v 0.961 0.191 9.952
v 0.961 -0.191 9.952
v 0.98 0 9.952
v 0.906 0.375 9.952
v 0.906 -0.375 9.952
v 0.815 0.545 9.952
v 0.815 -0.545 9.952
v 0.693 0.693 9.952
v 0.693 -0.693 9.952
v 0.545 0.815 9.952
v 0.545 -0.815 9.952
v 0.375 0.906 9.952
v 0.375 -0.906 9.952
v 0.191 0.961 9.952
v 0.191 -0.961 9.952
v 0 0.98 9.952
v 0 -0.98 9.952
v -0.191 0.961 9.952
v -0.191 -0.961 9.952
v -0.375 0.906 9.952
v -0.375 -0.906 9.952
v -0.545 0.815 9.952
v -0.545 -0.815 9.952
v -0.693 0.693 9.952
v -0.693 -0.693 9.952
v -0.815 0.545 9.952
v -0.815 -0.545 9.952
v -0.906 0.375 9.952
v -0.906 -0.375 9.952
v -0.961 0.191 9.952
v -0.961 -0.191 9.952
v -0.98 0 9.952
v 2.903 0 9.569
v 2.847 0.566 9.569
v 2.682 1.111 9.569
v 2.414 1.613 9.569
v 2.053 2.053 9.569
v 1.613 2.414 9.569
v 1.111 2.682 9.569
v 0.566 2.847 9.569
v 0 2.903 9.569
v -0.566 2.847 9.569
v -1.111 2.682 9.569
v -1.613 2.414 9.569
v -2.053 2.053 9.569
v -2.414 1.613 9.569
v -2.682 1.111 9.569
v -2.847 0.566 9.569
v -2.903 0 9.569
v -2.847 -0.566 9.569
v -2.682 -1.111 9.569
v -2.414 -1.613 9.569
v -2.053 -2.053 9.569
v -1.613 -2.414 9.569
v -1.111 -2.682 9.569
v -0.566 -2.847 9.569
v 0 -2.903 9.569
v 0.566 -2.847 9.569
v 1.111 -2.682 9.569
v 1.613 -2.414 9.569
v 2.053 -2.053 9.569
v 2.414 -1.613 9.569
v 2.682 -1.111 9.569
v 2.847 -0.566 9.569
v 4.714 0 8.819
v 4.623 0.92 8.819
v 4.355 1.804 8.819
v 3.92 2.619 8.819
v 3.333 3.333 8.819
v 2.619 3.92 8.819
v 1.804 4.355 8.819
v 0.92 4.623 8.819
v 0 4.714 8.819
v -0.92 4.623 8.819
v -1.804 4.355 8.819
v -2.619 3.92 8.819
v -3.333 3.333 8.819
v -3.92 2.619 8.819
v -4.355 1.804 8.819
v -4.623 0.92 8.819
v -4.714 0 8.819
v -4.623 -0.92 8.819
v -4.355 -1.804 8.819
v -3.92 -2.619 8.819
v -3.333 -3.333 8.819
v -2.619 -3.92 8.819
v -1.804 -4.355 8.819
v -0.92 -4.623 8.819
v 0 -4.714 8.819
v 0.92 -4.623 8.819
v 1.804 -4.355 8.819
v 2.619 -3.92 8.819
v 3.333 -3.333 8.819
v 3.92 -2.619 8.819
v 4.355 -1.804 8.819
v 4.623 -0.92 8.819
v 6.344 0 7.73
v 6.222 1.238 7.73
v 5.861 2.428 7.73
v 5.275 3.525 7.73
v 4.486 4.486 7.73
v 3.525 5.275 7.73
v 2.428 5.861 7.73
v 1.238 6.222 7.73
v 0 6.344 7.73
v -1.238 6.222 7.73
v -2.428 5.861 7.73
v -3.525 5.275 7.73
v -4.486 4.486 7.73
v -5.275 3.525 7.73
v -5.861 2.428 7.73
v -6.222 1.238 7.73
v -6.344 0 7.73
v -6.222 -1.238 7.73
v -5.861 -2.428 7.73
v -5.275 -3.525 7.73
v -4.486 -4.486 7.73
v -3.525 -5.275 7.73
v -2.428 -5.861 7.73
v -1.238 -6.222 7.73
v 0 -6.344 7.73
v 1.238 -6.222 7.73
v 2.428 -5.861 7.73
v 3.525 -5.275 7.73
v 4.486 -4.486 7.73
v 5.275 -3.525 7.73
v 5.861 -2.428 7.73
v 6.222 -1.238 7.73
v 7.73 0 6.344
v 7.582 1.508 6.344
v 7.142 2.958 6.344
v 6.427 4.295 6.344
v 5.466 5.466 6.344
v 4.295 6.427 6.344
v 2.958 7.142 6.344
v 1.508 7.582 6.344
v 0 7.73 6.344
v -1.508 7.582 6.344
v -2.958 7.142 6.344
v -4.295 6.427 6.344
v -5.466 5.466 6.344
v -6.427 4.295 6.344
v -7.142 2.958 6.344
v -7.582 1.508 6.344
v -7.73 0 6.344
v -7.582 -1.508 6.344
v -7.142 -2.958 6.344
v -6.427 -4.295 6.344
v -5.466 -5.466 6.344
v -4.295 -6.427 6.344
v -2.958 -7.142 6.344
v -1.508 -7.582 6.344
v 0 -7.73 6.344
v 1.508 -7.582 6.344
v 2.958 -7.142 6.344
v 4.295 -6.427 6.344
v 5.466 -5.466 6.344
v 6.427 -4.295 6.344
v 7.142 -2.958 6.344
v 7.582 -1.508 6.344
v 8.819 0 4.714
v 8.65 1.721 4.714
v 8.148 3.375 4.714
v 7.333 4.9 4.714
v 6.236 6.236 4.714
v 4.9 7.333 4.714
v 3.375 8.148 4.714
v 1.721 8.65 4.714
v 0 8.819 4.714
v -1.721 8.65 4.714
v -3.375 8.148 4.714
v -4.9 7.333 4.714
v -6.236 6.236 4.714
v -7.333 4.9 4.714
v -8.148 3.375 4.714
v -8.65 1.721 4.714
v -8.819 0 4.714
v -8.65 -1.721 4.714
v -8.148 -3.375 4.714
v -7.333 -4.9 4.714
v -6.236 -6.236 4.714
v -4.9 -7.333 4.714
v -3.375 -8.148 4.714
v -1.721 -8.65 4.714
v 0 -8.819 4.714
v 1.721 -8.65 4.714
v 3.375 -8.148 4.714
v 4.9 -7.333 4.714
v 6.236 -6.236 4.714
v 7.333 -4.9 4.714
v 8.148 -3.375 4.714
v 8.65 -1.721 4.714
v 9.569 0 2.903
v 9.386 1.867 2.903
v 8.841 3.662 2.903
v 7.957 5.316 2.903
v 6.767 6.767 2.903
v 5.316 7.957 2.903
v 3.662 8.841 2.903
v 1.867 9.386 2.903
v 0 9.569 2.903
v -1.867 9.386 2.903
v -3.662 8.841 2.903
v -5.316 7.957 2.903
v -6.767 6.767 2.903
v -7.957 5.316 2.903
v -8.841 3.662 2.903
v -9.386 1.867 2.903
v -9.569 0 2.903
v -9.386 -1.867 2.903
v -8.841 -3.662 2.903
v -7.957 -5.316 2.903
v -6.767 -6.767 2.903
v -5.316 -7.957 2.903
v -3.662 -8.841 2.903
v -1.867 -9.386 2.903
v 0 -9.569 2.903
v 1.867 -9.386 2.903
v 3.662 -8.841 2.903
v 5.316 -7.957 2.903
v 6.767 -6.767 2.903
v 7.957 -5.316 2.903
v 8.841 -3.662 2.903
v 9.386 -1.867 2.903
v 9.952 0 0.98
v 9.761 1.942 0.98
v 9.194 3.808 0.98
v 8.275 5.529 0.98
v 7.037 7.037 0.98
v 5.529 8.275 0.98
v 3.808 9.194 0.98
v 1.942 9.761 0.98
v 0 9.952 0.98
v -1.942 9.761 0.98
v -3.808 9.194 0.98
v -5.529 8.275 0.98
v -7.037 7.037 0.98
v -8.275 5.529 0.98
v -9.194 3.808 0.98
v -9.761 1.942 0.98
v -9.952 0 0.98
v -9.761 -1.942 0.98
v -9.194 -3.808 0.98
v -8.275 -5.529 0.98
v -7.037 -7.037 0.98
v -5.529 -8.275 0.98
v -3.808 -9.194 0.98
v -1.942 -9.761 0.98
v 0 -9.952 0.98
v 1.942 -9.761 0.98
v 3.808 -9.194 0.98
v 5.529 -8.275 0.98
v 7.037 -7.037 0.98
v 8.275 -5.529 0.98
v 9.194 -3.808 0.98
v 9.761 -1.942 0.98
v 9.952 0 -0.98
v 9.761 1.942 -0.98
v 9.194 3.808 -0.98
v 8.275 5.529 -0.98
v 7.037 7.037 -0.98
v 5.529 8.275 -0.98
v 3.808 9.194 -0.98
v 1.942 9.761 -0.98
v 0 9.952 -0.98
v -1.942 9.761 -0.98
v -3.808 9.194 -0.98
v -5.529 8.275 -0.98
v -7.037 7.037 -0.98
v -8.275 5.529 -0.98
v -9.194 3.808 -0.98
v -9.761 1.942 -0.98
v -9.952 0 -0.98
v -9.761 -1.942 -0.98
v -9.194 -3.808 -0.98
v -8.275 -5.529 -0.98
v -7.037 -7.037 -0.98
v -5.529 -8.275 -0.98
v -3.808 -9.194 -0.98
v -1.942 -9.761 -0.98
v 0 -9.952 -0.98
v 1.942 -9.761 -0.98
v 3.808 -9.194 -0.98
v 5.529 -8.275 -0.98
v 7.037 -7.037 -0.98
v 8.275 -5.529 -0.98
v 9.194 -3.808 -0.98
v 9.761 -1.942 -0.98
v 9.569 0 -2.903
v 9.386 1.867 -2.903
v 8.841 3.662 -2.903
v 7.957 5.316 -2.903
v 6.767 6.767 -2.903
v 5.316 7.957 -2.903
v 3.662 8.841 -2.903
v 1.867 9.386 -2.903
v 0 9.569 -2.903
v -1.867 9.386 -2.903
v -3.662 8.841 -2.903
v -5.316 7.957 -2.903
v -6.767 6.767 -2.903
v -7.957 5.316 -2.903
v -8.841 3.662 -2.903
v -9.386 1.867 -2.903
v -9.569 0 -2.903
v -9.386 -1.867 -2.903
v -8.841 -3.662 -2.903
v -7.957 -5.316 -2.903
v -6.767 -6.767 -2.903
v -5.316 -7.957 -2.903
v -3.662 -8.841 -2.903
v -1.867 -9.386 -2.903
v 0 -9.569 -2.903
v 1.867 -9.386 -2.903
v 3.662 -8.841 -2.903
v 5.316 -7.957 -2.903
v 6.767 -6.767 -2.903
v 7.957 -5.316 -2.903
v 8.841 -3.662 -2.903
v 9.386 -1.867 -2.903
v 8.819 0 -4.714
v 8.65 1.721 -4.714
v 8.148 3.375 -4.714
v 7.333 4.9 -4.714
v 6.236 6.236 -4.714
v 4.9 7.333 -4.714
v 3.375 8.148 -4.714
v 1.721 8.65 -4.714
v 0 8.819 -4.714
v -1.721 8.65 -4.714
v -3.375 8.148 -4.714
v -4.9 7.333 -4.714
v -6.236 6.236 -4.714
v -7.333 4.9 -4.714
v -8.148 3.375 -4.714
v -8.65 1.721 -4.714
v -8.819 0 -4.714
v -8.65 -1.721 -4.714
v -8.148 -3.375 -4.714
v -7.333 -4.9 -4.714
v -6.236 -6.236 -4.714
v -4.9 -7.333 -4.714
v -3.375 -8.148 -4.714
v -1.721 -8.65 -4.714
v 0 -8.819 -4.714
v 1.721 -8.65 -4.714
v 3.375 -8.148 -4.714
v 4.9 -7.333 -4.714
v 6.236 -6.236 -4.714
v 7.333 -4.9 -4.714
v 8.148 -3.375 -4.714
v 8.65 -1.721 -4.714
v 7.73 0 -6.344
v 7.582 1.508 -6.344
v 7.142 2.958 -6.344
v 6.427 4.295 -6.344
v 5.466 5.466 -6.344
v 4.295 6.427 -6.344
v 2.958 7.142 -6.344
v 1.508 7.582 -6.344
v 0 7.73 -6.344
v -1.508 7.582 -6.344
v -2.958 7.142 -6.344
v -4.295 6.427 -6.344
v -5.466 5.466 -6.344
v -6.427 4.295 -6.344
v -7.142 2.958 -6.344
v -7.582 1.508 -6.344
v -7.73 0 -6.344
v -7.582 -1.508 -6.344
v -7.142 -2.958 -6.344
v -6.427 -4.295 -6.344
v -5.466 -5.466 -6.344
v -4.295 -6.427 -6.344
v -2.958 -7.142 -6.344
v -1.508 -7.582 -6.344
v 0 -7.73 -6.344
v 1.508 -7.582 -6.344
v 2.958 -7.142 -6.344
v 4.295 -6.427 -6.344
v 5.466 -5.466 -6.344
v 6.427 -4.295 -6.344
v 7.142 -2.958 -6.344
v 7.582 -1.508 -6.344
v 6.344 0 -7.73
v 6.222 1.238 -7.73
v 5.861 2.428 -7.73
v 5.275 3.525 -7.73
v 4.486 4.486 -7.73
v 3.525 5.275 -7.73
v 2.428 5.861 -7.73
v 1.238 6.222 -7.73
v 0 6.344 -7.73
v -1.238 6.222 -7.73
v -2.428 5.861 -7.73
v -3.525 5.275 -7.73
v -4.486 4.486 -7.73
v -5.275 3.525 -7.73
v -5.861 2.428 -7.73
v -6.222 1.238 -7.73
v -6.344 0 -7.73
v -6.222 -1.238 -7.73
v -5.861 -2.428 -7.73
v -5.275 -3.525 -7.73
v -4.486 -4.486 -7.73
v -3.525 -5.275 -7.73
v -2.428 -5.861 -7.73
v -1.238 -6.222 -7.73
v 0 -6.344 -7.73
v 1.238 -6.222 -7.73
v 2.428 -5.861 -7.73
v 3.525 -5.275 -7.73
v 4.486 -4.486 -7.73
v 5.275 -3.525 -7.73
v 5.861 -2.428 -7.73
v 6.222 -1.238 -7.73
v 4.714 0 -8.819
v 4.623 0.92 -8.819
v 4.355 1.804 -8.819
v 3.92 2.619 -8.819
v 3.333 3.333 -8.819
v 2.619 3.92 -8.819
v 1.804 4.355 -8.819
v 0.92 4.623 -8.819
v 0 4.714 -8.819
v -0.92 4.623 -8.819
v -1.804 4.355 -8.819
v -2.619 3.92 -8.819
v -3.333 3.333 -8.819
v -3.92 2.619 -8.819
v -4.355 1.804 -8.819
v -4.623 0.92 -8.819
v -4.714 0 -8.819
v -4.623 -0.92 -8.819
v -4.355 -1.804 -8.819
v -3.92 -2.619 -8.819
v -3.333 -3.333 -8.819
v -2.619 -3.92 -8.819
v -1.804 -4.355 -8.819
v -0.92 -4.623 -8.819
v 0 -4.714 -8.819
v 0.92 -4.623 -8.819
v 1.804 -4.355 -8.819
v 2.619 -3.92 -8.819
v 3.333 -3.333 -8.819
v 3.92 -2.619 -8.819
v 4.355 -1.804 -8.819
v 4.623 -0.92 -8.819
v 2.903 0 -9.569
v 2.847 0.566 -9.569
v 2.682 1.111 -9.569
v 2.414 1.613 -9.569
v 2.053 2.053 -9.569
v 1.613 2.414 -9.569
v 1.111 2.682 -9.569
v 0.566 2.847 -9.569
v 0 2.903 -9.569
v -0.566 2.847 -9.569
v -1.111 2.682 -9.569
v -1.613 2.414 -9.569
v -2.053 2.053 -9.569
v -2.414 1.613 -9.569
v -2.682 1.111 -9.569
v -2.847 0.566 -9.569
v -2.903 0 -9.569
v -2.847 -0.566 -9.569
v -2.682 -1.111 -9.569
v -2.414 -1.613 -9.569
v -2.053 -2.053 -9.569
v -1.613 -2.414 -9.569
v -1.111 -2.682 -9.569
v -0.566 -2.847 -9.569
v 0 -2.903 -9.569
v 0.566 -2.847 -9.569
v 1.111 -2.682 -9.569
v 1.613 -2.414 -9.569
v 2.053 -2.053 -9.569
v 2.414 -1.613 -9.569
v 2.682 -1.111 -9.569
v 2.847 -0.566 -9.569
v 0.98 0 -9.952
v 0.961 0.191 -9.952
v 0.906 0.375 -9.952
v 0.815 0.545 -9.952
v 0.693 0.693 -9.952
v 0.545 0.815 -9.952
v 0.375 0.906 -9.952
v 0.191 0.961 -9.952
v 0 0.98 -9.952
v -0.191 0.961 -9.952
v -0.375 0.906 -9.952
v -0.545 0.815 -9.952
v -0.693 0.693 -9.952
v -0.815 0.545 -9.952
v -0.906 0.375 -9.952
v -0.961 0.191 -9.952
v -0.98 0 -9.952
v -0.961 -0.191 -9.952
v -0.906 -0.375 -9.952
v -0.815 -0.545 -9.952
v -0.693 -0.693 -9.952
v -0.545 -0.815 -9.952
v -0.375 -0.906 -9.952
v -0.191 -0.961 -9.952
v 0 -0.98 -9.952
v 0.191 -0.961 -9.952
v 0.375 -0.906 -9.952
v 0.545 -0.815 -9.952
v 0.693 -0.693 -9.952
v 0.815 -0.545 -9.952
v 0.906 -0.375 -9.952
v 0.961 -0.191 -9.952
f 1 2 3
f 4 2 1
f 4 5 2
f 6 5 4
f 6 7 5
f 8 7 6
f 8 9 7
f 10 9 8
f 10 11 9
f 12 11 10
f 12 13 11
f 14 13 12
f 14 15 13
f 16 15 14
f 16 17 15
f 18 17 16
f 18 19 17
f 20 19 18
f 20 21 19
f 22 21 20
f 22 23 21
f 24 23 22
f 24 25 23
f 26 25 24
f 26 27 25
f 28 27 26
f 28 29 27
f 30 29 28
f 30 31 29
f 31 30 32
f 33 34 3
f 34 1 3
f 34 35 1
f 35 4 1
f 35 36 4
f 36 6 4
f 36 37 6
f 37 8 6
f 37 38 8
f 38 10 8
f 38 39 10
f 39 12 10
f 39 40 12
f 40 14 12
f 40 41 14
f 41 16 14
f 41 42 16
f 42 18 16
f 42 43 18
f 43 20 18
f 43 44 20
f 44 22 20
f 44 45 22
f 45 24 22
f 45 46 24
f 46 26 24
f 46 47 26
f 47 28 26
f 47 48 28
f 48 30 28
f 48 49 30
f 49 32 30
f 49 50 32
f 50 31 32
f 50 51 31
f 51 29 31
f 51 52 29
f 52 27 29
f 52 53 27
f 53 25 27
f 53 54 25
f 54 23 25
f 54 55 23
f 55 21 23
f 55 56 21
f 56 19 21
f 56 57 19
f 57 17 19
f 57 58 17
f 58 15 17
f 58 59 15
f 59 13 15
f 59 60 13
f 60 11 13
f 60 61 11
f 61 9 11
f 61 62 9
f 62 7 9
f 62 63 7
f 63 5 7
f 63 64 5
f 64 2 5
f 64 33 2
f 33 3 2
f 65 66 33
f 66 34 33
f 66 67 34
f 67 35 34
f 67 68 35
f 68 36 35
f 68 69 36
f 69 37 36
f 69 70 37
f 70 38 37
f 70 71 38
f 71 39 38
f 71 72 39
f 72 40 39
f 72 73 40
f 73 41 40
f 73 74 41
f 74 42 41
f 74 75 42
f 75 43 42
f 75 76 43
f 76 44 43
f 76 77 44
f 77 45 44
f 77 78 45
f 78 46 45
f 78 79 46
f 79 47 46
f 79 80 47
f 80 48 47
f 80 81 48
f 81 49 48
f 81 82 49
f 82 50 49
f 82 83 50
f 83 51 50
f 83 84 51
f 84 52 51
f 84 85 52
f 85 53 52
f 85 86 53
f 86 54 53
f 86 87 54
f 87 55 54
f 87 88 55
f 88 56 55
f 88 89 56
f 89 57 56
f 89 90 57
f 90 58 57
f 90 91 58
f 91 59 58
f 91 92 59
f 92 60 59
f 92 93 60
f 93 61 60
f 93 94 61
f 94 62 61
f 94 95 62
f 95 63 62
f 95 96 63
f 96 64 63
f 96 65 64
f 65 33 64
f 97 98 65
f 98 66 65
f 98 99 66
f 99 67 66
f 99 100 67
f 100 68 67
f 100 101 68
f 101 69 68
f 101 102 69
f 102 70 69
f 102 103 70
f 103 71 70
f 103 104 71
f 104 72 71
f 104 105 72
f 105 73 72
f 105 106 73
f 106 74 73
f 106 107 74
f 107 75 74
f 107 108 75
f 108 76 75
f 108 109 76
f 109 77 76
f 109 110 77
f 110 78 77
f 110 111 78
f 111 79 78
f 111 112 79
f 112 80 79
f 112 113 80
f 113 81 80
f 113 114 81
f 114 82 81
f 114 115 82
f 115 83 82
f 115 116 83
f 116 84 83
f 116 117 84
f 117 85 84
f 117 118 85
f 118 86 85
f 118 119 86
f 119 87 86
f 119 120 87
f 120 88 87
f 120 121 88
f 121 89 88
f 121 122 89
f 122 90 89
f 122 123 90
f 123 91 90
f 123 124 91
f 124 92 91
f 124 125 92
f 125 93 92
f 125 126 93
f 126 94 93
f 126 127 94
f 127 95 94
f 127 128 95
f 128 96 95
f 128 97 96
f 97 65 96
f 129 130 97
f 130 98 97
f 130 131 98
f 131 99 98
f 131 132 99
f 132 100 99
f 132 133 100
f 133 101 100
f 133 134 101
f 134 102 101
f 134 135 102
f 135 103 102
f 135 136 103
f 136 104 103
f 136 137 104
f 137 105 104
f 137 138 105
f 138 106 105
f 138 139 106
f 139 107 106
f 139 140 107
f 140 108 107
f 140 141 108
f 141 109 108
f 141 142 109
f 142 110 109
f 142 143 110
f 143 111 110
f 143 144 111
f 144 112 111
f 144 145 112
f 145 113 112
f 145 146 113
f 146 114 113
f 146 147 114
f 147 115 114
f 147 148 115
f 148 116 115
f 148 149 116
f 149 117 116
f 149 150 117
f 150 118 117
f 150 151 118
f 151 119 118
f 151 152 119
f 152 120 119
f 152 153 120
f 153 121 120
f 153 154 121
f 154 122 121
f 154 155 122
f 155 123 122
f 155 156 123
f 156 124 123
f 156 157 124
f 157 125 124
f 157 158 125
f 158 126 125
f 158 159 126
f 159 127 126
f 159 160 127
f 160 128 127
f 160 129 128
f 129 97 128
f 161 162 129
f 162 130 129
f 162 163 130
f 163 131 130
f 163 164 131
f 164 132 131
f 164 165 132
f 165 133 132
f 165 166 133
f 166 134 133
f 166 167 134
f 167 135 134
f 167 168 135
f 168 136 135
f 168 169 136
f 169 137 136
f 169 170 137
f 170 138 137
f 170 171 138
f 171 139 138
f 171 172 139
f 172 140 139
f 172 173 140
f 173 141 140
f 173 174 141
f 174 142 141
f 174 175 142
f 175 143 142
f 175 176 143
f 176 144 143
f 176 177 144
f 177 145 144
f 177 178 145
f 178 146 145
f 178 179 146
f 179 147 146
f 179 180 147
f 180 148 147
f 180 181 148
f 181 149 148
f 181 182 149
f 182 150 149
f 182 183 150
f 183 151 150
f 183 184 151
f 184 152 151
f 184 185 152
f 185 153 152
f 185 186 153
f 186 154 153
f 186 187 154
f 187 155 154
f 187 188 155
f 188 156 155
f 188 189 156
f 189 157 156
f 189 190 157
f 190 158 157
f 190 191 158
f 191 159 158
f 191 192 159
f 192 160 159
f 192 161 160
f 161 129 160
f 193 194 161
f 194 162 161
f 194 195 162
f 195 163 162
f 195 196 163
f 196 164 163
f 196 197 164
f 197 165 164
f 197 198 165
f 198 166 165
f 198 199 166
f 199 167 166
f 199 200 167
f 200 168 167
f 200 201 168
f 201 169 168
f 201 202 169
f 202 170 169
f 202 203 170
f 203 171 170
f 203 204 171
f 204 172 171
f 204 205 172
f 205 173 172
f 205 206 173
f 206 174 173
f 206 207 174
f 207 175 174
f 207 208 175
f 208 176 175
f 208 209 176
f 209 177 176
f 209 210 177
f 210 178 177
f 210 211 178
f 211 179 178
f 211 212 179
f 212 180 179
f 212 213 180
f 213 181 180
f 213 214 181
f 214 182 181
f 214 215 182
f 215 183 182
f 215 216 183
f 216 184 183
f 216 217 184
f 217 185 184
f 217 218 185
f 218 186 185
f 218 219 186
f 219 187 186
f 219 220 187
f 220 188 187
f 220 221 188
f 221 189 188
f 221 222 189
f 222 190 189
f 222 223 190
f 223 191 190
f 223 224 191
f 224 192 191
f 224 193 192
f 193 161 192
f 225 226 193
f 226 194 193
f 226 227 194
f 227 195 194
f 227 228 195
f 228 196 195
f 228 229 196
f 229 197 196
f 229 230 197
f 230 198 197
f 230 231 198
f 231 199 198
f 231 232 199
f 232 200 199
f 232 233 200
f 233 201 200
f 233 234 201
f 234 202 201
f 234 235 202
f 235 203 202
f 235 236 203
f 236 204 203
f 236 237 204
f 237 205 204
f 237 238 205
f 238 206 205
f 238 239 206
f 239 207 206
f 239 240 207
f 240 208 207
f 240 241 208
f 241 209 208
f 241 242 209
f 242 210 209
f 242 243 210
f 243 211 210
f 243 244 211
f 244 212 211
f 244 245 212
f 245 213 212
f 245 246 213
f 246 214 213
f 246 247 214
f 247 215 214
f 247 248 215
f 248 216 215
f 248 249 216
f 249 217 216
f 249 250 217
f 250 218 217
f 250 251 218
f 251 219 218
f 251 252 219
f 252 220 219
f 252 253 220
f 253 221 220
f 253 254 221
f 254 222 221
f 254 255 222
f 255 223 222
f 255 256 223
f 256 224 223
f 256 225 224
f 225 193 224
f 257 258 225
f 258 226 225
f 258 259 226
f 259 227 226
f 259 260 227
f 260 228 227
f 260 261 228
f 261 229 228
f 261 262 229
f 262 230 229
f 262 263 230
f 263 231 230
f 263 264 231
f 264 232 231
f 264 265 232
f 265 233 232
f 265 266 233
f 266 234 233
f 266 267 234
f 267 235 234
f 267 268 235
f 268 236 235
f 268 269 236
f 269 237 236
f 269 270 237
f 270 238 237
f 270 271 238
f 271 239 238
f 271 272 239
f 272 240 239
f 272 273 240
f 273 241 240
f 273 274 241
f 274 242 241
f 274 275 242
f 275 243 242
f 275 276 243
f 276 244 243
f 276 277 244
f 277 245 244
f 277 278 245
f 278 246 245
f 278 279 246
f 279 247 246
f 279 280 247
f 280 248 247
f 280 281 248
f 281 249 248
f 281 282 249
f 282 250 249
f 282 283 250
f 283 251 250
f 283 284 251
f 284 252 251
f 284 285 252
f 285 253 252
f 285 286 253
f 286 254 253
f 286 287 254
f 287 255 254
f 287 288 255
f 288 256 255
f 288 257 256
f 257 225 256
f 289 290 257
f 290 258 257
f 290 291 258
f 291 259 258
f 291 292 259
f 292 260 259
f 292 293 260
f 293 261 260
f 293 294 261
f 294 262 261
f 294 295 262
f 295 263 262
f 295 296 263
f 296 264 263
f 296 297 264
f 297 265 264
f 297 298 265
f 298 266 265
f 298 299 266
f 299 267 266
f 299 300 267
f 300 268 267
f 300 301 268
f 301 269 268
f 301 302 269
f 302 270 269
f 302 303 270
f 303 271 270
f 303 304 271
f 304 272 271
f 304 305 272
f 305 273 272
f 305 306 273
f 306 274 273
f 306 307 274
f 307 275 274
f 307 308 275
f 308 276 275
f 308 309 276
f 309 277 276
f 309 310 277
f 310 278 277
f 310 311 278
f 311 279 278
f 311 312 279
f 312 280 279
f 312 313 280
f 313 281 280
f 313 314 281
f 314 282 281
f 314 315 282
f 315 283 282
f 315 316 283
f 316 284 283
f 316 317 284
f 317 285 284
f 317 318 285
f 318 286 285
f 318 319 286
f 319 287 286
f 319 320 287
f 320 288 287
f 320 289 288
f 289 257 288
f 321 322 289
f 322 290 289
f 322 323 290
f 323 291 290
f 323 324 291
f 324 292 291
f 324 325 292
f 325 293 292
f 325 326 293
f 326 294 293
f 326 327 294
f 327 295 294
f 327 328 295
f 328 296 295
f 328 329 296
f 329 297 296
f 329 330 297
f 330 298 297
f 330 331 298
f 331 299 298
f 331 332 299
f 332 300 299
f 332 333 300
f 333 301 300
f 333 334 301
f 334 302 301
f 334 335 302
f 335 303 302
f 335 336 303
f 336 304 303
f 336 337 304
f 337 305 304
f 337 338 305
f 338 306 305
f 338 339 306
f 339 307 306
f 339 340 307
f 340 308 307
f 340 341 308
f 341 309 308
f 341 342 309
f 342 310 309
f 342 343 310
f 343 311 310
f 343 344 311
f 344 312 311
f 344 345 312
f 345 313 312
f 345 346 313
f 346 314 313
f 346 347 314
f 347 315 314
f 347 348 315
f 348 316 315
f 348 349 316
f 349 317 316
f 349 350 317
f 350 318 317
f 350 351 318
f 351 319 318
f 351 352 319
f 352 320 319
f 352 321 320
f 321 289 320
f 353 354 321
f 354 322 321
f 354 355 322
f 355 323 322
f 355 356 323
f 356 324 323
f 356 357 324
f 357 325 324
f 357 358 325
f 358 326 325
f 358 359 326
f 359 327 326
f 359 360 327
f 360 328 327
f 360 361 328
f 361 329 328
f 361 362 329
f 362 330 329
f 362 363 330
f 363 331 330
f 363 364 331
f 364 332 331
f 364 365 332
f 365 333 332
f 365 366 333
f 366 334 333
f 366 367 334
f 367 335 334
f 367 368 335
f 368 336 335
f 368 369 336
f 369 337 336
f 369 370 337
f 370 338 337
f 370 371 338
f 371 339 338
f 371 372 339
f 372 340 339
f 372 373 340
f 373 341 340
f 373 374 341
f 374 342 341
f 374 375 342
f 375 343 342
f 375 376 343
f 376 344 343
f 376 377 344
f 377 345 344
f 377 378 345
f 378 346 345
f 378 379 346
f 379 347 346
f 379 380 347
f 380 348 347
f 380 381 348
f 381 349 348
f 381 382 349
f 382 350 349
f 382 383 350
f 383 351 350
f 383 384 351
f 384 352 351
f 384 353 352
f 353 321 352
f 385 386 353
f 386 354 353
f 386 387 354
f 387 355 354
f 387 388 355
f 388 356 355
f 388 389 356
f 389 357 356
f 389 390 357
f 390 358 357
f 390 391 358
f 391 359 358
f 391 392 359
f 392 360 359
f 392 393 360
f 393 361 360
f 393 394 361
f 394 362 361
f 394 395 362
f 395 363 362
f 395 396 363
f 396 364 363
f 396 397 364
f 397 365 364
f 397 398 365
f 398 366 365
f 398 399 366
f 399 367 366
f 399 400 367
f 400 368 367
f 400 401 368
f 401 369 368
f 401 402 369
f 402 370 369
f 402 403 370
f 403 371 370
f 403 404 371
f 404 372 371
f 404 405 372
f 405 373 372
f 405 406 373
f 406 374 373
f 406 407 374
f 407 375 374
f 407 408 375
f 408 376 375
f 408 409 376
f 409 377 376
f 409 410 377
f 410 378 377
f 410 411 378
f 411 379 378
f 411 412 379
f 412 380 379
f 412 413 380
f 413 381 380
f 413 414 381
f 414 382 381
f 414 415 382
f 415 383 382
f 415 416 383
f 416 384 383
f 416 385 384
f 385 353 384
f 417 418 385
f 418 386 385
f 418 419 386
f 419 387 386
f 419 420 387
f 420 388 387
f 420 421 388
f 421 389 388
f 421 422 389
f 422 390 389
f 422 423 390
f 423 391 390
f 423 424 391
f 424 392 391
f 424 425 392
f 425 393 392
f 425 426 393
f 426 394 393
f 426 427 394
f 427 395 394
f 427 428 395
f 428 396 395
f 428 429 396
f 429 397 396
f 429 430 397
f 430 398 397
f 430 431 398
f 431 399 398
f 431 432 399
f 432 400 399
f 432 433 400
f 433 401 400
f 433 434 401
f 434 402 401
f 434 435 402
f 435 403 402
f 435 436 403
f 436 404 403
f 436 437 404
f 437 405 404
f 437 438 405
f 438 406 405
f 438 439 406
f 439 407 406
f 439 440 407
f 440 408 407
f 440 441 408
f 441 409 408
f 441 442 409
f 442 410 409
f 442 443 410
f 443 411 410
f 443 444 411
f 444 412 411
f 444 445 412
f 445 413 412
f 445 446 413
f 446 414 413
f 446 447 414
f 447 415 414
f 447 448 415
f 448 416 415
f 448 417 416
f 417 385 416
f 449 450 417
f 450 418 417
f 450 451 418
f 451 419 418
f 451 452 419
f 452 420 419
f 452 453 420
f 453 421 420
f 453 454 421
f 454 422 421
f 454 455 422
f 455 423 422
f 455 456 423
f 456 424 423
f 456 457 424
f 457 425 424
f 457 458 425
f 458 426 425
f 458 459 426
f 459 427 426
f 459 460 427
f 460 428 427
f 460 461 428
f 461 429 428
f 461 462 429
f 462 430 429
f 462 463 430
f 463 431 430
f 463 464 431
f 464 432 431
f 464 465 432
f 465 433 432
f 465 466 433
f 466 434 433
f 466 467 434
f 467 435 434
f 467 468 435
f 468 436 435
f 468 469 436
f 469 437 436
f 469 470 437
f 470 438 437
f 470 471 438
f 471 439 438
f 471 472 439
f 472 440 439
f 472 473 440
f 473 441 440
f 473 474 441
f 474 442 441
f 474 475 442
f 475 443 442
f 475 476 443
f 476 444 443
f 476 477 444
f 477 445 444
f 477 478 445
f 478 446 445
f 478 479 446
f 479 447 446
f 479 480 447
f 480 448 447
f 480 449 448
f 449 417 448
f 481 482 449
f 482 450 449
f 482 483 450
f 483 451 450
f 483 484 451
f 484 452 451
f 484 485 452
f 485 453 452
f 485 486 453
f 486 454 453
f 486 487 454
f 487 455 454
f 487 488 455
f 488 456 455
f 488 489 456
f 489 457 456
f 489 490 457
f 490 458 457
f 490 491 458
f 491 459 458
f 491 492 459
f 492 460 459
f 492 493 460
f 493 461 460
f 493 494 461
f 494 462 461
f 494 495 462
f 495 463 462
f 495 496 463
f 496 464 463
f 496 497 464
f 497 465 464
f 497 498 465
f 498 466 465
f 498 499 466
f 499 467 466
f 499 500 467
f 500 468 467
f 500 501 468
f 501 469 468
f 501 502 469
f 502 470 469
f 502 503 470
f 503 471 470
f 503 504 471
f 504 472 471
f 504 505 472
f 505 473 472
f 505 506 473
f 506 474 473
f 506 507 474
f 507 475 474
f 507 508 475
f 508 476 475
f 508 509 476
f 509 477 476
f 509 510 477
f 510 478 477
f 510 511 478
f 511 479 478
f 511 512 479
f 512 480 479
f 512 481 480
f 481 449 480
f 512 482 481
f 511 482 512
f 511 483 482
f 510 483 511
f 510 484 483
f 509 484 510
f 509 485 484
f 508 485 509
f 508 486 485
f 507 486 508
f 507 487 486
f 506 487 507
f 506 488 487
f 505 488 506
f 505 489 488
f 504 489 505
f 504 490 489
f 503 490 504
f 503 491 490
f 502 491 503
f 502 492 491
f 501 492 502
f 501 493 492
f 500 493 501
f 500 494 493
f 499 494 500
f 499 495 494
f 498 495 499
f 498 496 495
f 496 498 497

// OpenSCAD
// A sphere, which collapses into a stack of exact cones and then closes.
//
// A sphere is not a band and is not going to become one: its facets span many
// rings rather than two rims, so the strip walk cannot describe it and a
// SPHERICAL_SURFACE would need a grower of its own. But the mesh *between* two
// consecutive rings is a band - a frustum whose rims are those two circles -
// and a cone is accepted when both of its rims match a declared cylinder. So
// declaring the rings collapses the whole sphere with no new recogniser work,
// exactly as a torus does.
//
// Two things about OpenSCAD's sphere shape the pass:
//
//   - It has **no pole vertex**. The rings sit at phi = 180(i+0.5)/num_rings,
//     so the first and last are ordinary circles and the mesh closes each end
//     with a flat disc rather than a fan of triangles meeting at a point.
//   - The ring radii repeat in pairs about the equator, so 16 rings give 8
//     distinct records, and the two rings straddling the equator have the same
//     radius - that band is a cylinder, not a cone.
//
// The rings are then *merged*. A sphere is a stack of bands, so the zone is the
// maximal run of them joined at shared rims whose vertices all lie on the
// declared sphere - which makes one SPHERICAL_SURFACE out of all 15 without any
// grower of its own. Flooding across edges instead does not work and this
// fixture is why: the caps have every vertex on the sphere too, with the same
// sag as any ring quad, so a geometric test cannot tell them apart. Only the
// structure can, and the band pass has already worked it out.
//
// The seam is the one genuinely new thing. A periodic face is closed by a seam
// which has to lie *on* the surface; up a cylinder that is a straight ruling,
// but over a sphere it is a meridian, and the straight line between the same
// two vertices sags 0.048 mm off a radius 10 sphere - five thousand times the
// modelling tolerance. So the seam here is an arc of a great circle.
//
// Expected at $fn = 32: num_rings = 16, so 480 quads plus two caps, 482 faces.
// 9 analytic surfaces available (8 cylindrical, 1 spherical, 0 toroidal, 0 Bezier),
// 1 surface recognised - spherical, not conical, not partial - with 482 facets
// replaced: the 480 quads and the two caps the closure absorbs.
//
// If the report says 15 surfaces and 14 conical, the merge did not happen and
// this is the cone stack again.
//
// Measured, and asserted by the driver: what the exporter has to report for
// the above to have happened. A silently faceted export is still a valid one,
// so validity alone cannot see a recogniser that has stopped recognising.
// EXPECT: 9 analytic surfaces available (8 cylindrical, 1 spherical, 0 toroidal, 0 Bezier)
// EXPECT: 1 surface recognised (0 toroidal, 1 spherical, 0 conical, 0 partial), 482 facets replaced
//
// **The caps are the tessellation's, not the model's.** This fixture used to
// assert 4188.6447513 - the sphere less two spherical caps of height
// 10*(1 - cos 5.625) - on the argument that an OpenSCAD sphere legitimately
// ends in a flat disc at either pole and the export was being faithful to the
// mesh. It was faithful to the mesh and wrong about the model: `sphere()`
// declares a whole sphere and carries no latitude bound, so a disc at the pole
// is an artefact of how many rings the tessellation chose, and writing it
// exported a solid 0.0035% short with two planar faces the model never asked
// for. What the export owes is the declared sphere.
//
// So: one face, no planes, and (4/3)*pi*r^3 exactly. A sphere closed on itself
// has no rim to bound it - it is bounded by its seam meridian alone, used once
// in either direction, with the poles where the two usages meet. The two
// degenerate edges are the zero length ones OCCT inserts at those poles itself.
// ROUNDTRIP: Sphere=1
// EDGES: Circle=1 degenerate=2
// RADII: Sphere=10
//
// And the same again with the approximation flag, which every fixture is now
// exported under. Nothing changes and that is the assertion: the analytic pass
// has already covered all 482 facets, so there is no uncovered region left for
// a fit to be attempted on, and a tier that invented one here would be fitting
// a surface to facets that already have theirs.
// ROUNDTRIP-APPROX: Sphere=1
// EDGES-APPROX: Circle=1 degenerate=2
// VOLUME-APPROX: 4188.7902048
//
// (4/3)*pi*1000, derived from the declaration and from nothing the exporter
// printed. The tessellation does not appear in it, which is the point: this is
// the assertion that separates the declared sphere from the mesh's inscribed
// polyhedron with its poles sliced off. A face census cannot make that
// separation - both read as one Sphere beside some planes - so the volume is
// the check that matters here.
// VOLUME: 4188.7902048
//
// Every EXPORT-WARNING this fixture raises, named, each with why it is known;
// any other fails the test, and so does a named one no run raises any more.
//
// One declared surface written partly by one recogniser and partly by
// another, the division decided by pass order - the split surface of open
// item 26, which R0 (item 29) has not reached here.
// KNOWN-EXPORT-WARNING: split between different kinds of recogniser
// KNOWN-EXPORT-WARNING: so this is one connected region cut in two by pass order
//
// Corners the file does not write: the export writes one closed face here,
// and every corner it does write is on its surface at about 1e-15
// (scripts/step-corner-stray.py). The arbiter counts corners of faces that
// are not written, against the wrong surface - open item 43, W1.
// KNOWN-EXPORT-WARNING: left off a surface the file writes a face of them on
$fn = 32;
sphere(r = 10);
